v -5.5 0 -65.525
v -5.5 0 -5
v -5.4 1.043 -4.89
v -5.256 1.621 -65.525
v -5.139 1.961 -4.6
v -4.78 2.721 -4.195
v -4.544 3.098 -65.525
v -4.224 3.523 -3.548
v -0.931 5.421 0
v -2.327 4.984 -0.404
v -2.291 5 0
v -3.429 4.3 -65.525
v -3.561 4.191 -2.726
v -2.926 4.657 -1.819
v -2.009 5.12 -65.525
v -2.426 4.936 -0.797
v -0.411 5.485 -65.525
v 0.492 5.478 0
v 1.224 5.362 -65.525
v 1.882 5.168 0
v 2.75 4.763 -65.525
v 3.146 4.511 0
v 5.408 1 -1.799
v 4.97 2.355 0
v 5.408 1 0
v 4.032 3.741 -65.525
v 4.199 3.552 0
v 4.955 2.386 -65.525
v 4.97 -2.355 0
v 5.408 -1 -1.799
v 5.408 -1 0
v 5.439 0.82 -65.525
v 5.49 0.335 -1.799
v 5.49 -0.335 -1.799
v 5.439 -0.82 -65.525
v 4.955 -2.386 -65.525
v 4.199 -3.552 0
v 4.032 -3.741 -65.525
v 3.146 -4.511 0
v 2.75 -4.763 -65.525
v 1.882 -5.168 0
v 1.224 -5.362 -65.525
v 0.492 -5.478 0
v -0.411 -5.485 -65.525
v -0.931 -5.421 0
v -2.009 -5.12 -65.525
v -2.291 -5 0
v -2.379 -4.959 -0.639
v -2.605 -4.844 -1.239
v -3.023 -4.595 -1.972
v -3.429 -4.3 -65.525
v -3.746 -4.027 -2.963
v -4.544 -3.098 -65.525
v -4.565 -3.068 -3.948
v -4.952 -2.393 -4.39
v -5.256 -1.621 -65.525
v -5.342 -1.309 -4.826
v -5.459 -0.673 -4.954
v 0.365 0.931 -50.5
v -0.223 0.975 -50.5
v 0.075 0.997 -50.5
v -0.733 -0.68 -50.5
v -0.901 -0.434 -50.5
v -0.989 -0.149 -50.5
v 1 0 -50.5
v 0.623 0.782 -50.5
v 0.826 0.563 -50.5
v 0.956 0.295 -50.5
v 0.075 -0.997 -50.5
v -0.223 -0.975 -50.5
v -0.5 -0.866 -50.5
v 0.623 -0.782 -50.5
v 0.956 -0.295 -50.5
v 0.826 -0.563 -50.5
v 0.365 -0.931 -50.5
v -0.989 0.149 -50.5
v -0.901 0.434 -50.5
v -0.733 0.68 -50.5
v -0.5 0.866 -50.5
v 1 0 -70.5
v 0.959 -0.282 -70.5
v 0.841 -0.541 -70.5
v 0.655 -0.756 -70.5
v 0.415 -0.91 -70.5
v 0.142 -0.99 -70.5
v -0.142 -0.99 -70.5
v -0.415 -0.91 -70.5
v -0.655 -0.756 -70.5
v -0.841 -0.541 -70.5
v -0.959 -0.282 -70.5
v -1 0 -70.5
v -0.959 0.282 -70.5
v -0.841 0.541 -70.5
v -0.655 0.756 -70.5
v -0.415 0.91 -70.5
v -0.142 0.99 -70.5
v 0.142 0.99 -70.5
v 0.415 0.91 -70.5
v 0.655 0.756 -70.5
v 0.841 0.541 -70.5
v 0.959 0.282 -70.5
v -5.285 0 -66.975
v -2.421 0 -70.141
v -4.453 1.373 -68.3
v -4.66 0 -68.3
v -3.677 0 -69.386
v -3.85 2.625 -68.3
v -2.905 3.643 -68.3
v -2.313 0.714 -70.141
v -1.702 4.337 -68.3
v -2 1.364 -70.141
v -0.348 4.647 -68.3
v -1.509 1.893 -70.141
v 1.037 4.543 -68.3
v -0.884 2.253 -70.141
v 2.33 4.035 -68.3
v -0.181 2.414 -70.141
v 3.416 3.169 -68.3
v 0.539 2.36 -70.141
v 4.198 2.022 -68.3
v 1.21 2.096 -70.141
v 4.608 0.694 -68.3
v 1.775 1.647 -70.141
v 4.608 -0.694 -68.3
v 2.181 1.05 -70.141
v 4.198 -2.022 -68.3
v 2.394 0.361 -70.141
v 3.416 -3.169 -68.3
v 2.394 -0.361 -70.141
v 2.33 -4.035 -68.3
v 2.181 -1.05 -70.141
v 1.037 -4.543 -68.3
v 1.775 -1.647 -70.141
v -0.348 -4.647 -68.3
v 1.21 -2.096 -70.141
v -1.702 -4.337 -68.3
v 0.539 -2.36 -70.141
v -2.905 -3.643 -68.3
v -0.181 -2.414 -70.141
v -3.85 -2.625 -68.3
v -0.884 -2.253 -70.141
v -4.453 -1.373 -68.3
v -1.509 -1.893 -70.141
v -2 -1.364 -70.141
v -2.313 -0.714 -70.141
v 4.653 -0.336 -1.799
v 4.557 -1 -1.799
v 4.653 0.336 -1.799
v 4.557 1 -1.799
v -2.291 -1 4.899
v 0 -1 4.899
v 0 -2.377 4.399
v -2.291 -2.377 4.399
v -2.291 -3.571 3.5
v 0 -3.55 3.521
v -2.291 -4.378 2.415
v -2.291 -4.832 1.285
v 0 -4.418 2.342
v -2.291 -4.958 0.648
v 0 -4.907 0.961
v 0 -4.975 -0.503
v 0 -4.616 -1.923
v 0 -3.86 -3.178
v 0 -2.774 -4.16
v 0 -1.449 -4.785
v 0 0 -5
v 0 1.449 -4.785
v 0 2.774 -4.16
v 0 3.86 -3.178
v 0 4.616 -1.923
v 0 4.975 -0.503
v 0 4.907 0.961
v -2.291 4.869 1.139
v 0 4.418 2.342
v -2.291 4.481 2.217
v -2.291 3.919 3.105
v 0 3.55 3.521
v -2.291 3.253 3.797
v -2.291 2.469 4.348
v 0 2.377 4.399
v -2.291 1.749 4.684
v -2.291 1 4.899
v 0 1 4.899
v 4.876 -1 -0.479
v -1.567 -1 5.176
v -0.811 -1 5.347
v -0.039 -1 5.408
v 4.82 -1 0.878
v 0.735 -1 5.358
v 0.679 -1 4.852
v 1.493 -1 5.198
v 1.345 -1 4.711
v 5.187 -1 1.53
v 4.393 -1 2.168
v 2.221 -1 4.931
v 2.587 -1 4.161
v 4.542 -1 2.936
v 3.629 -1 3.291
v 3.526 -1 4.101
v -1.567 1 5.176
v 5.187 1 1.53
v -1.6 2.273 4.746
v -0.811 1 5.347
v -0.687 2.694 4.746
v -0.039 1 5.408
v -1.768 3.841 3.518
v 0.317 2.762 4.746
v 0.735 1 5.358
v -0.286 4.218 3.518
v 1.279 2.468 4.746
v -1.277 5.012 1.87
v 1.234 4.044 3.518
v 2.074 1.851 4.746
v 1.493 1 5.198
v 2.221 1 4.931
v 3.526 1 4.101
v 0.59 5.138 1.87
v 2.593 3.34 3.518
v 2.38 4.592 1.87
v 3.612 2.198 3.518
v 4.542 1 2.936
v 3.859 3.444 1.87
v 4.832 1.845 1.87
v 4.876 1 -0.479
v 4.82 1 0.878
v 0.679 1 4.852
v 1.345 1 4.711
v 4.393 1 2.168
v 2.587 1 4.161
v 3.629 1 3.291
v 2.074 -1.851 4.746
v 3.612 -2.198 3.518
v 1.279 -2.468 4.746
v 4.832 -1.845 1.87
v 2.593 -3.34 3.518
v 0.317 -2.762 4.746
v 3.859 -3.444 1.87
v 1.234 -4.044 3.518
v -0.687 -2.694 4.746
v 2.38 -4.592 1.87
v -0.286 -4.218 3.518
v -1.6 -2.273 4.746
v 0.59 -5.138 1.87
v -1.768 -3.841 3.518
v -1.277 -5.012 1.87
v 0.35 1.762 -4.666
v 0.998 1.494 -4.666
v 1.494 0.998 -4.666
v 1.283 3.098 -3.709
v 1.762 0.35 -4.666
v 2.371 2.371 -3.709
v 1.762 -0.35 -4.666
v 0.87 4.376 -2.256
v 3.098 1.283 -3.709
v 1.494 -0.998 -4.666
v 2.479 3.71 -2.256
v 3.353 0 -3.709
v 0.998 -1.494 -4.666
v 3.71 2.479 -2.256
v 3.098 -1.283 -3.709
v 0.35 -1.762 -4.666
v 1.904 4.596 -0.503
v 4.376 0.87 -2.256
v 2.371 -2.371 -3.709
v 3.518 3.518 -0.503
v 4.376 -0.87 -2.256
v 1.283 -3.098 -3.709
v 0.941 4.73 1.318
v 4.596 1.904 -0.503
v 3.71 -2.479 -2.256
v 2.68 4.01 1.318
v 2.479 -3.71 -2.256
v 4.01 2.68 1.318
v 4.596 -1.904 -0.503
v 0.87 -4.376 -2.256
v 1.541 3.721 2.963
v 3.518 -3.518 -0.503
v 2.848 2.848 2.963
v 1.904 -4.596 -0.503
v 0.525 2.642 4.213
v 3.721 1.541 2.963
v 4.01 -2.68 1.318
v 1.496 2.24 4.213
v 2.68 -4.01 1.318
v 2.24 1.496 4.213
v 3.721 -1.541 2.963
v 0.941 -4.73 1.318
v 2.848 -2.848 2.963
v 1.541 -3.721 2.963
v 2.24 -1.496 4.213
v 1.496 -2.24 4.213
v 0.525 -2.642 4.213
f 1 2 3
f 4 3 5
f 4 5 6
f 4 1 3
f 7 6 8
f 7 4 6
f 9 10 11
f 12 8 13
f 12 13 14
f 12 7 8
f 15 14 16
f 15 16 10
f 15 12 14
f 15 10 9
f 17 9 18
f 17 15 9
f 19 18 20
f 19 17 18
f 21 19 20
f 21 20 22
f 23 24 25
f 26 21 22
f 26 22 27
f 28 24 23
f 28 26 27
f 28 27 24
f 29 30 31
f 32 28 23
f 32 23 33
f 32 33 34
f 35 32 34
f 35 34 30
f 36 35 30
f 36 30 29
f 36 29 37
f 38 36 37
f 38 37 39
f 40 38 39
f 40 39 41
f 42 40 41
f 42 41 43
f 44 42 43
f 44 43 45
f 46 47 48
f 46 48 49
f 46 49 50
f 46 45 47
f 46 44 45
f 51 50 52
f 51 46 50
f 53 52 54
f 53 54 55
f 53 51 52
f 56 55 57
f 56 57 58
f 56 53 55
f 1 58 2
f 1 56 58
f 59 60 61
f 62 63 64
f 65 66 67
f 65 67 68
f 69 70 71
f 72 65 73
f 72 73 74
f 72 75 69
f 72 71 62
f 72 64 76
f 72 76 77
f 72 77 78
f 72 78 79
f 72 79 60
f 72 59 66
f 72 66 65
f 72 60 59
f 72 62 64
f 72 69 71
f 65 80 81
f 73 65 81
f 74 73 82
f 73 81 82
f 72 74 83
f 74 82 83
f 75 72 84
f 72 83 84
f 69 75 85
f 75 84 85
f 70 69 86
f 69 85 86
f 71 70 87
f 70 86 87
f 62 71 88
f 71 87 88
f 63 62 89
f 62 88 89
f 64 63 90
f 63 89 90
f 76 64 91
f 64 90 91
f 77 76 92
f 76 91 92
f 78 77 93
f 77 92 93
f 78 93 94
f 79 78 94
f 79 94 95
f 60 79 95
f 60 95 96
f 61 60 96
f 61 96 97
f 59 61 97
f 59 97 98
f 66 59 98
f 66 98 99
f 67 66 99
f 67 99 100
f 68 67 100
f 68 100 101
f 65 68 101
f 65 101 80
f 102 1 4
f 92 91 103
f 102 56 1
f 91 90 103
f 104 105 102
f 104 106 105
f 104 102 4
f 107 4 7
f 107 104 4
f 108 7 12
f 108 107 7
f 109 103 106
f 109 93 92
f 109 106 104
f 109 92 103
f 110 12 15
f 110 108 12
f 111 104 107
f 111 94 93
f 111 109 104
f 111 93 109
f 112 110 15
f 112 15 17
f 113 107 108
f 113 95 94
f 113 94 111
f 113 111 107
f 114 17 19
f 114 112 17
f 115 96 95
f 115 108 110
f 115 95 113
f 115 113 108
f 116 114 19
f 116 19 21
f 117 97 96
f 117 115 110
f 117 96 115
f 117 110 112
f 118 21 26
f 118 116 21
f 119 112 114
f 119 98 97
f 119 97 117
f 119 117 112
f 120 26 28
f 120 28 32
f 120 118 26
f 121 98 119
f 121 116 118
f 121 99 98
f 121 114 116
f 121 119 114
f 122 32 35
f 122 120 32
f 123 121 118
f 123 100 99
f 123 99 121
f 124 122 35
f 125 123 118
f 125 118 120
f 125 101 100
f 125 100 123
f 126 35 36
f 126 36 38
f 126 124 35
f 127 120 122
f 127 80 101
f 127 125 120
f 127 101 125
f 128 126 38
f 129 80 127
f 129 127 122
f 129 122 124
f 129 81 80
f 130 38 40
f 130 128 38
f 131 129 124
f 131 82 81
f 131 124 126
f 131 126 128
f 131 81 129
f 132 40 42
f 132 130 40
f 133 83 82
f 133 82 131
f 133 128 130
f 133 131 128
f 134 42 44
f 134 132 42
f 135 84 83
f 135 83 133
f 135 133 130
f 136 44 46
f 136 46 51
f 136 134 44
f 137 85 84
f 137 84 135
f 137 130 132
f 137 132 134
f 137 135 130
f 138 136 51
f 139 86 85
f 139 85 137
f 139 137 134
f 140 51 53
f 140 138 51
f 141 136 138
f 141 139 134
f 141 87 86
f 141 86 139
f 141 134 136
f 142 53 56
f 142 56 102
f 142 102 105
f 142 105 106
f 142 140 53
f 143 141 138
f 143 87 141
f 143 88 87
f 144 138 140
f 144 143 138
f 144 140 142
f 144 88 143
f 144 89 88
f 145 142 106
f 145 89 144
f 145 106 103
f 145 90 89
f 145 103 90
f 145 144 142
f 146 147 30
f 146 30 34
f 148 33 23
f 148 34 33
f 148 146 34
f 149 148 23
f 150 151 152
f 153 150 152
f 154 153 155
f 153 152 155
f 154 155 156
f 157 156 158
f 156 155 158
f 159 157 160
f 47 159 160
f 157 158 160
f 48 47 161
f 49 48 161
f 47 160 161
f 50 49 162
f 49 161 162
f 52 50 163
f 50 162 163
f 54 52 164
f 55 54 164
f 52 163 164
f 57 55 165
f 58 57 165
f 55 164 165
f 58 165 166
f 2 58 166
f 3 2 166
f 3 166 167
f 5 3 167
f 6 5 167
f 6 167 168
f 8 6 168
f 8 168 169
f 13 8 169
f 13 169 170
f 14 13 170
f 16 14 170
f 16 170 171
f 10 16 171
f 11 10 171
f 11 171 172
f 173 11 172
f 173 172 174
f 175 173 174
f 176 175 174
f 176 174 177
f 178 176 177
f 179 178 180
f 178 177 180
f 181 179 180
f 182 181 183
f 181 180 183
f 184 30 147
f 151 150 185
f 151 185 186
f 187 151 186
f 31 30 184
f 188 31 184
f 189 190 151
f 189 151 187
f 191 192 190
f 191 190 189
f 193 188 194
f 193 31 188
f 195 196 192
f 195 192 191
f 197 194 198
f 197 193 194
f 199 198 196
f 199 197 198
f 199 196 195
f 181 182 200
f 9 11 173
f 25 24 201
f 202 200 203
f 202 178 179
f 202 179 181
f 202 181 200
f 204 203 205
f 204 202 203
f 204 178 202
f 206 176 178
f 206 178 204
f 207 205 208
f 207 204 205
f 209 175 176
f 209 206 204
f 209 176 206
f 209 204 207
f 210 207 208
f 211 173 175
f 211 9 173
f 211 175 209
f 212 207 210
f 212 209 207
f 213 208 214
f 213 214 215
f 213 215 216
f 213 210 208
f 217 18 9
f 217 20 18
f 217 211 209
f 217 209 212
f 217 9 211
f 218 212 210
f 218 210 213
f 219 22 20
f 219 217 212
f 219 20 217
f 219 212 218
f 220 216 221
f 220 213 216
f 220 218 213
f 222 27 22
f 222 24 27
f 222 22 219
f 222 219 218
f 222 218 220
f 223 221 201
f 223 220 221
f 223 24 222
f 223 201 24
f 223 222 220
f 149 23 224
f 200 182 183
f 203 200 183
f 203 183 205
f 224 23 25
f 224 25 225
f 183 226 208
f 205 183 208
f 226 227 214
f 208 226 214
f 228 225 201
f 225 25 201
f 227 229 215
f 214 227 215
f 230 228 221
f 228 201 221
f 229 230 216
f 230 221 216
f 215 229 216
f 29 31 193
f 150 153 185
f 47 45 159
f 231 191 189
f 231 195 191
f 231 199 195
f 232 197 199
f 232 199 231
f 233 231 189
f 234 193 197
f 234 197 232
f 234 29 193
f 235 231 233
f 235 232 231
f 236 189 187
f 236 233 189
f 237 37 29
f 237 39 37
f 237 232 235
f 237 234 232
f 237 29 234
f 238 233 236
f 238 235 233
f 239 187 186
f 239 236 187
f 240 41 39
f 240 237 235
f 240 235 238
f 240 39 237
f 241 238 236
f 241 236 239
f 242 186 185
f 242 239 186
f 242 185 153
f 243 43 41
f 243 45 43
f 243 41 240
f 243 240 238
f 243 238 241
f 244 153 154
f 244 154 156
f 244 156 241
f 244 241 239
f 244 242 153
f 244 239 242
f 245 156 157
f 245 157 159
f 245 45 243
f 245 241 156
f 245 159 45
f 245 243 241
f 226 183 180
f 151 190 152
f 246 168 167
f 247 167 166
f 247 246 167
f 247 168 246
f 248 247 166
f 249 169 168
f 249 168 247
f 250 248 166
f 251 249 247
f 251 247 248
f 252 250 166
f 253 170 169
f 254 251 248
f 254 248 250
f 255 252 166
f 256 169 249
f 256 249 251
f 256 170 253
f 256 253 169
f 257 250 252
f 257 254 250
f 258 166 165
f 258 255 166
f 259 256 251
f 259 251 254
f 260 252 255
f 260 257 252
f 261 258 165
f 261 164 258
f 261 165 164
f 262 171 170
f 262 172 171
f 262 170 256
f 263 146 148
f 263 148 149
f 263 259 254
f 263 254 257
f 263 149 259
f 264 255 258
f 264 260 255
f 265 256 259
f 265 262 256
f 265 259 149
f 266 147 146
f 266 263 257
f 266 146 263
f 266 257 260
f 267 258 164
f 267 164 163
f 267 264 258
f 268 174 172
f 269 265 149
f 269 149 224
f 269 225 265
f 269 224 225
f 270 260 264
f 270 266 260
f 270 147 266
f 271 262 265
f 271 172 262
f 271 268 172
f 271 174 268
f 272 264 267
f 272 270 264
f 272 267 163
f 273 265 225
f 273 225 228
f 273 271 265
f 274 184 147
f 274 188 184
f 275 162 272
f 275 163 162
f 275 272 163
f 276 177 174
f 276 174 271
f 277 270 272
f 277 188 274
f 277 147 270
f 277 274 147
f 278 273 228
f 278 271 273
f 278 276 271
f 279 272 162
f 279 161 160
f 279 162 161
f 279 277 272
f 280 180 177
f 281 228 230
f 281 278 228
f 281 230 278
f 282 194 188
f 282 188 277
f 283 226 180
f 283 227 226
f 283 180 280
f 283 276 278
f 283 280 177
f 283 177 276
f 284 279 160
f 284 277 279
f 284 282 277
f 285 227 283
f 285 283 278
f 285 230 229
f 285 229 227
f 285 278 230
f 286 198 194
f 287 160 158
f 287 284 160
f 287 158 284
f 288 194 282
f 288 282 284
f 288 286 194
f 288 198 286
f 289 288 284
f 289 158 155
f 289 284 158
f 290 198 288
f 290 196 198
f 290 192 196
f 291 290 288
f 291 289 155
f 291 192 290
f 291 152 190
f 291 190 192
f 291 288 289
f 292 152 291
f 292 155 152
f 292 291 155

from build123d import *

# Parameters (mm, degrees)
F2_R          = 5
F3_DEPTH      = 5.501
F4_W          = 2
F4_H          = 9
F5_DEPTH      = 12
F5_DEPTH_BACK = 25
F6_R          = 1
F7_DEPTH      = 20


# Not quite as in the source:
# - a fillet or chamfer that OpenCascade refuses, or shapes differently, is made with other operations: its cross-section is extruded or revolved along the edge and cut away or added


with BuildPart() as f1:
    # F0 (on Front) → F1 (revolve)
    with BuildSketch(Plane.XZ):
        with BuildLine():
            Line((0, 5), (0, 5.5))
            ThreePointArc((0, 5.5), (-3.8890872965, 3.8890872965), (-5.5, 0))
            ThreePointArc((-5.5, 0), (-3.8890872965, -3.8890872965), (0, -5.5))
            Line((0, -5.5), (0, -5))
            ThreePointArc((0, -5), (-5, 0), (0, 5))
        make_face()
        with BuildLine():
            Line((0, -70.5), (0, -5.5))
            ThreePointArc((0, -5.5), (-3.8890872965, -3.8890872965), (-5.5, 0))
            Line((-5.5, 0), (-5.5, -70.5))
            Line((-5.5, -70.5), (0, -70.5))
        make_face()
    revolve(axis=Axis((0, 0, -32.5), (0, 0, -1)))

    # F2 (on Right) → F3 (cut, through all)
    with BuildSketch(Plane.YZ):
        Circle(F2_R)
    extrude(amount=-F3_DEPTH, mode=Mode.SUBTRACT)

    # F4 (on Right) → F5 (cut, two sides)
    with BuildSketch(Plane.YZ) as f5_sk:
        with Locations((0, 2.7013579383)):
            Rectangle(F4_W, F4_H)
    extrude(amount=-F5_DEPTH, mode=Mode.SUBTRACT)
    extrude(f5_sk.sketch, amount=F5_DEPTH_BACK, mode=Mode.SUBTRACT)

    # F6 (on face) → F7 (cut)
    with BuildSketch(Plane(origin=(0, 0, -70.5), x_dir=(1, 0, 0), z_dir=(0, 0, -1))):
        Circle(F6_R)
    extrude(amount=-F7_DEPTH, mode=Mode.SUBTRACT)

    # F8: fillet of radius 5 on 1 edges, made by hand

    # F8_s1 → F8_t2 (revolve, cut)
    with BuildSketch(Plane.XZ):
        with BuildLine():
            ThreePointArc((-5.5, -65.5250628145), (-4.2080992435, -68.8791647807), (-1, -70.5))
            Line((-1, -70.5), (-5.5, -70.5))
            Line((-5.5, -70.5), (-5.5, -65.5250628145))
        make_face()
    revolve(axis=Axis((0, 0, -70.5), (0, 0, -1)), mode=Mode.SUBTRACT)


solid = f1.part
